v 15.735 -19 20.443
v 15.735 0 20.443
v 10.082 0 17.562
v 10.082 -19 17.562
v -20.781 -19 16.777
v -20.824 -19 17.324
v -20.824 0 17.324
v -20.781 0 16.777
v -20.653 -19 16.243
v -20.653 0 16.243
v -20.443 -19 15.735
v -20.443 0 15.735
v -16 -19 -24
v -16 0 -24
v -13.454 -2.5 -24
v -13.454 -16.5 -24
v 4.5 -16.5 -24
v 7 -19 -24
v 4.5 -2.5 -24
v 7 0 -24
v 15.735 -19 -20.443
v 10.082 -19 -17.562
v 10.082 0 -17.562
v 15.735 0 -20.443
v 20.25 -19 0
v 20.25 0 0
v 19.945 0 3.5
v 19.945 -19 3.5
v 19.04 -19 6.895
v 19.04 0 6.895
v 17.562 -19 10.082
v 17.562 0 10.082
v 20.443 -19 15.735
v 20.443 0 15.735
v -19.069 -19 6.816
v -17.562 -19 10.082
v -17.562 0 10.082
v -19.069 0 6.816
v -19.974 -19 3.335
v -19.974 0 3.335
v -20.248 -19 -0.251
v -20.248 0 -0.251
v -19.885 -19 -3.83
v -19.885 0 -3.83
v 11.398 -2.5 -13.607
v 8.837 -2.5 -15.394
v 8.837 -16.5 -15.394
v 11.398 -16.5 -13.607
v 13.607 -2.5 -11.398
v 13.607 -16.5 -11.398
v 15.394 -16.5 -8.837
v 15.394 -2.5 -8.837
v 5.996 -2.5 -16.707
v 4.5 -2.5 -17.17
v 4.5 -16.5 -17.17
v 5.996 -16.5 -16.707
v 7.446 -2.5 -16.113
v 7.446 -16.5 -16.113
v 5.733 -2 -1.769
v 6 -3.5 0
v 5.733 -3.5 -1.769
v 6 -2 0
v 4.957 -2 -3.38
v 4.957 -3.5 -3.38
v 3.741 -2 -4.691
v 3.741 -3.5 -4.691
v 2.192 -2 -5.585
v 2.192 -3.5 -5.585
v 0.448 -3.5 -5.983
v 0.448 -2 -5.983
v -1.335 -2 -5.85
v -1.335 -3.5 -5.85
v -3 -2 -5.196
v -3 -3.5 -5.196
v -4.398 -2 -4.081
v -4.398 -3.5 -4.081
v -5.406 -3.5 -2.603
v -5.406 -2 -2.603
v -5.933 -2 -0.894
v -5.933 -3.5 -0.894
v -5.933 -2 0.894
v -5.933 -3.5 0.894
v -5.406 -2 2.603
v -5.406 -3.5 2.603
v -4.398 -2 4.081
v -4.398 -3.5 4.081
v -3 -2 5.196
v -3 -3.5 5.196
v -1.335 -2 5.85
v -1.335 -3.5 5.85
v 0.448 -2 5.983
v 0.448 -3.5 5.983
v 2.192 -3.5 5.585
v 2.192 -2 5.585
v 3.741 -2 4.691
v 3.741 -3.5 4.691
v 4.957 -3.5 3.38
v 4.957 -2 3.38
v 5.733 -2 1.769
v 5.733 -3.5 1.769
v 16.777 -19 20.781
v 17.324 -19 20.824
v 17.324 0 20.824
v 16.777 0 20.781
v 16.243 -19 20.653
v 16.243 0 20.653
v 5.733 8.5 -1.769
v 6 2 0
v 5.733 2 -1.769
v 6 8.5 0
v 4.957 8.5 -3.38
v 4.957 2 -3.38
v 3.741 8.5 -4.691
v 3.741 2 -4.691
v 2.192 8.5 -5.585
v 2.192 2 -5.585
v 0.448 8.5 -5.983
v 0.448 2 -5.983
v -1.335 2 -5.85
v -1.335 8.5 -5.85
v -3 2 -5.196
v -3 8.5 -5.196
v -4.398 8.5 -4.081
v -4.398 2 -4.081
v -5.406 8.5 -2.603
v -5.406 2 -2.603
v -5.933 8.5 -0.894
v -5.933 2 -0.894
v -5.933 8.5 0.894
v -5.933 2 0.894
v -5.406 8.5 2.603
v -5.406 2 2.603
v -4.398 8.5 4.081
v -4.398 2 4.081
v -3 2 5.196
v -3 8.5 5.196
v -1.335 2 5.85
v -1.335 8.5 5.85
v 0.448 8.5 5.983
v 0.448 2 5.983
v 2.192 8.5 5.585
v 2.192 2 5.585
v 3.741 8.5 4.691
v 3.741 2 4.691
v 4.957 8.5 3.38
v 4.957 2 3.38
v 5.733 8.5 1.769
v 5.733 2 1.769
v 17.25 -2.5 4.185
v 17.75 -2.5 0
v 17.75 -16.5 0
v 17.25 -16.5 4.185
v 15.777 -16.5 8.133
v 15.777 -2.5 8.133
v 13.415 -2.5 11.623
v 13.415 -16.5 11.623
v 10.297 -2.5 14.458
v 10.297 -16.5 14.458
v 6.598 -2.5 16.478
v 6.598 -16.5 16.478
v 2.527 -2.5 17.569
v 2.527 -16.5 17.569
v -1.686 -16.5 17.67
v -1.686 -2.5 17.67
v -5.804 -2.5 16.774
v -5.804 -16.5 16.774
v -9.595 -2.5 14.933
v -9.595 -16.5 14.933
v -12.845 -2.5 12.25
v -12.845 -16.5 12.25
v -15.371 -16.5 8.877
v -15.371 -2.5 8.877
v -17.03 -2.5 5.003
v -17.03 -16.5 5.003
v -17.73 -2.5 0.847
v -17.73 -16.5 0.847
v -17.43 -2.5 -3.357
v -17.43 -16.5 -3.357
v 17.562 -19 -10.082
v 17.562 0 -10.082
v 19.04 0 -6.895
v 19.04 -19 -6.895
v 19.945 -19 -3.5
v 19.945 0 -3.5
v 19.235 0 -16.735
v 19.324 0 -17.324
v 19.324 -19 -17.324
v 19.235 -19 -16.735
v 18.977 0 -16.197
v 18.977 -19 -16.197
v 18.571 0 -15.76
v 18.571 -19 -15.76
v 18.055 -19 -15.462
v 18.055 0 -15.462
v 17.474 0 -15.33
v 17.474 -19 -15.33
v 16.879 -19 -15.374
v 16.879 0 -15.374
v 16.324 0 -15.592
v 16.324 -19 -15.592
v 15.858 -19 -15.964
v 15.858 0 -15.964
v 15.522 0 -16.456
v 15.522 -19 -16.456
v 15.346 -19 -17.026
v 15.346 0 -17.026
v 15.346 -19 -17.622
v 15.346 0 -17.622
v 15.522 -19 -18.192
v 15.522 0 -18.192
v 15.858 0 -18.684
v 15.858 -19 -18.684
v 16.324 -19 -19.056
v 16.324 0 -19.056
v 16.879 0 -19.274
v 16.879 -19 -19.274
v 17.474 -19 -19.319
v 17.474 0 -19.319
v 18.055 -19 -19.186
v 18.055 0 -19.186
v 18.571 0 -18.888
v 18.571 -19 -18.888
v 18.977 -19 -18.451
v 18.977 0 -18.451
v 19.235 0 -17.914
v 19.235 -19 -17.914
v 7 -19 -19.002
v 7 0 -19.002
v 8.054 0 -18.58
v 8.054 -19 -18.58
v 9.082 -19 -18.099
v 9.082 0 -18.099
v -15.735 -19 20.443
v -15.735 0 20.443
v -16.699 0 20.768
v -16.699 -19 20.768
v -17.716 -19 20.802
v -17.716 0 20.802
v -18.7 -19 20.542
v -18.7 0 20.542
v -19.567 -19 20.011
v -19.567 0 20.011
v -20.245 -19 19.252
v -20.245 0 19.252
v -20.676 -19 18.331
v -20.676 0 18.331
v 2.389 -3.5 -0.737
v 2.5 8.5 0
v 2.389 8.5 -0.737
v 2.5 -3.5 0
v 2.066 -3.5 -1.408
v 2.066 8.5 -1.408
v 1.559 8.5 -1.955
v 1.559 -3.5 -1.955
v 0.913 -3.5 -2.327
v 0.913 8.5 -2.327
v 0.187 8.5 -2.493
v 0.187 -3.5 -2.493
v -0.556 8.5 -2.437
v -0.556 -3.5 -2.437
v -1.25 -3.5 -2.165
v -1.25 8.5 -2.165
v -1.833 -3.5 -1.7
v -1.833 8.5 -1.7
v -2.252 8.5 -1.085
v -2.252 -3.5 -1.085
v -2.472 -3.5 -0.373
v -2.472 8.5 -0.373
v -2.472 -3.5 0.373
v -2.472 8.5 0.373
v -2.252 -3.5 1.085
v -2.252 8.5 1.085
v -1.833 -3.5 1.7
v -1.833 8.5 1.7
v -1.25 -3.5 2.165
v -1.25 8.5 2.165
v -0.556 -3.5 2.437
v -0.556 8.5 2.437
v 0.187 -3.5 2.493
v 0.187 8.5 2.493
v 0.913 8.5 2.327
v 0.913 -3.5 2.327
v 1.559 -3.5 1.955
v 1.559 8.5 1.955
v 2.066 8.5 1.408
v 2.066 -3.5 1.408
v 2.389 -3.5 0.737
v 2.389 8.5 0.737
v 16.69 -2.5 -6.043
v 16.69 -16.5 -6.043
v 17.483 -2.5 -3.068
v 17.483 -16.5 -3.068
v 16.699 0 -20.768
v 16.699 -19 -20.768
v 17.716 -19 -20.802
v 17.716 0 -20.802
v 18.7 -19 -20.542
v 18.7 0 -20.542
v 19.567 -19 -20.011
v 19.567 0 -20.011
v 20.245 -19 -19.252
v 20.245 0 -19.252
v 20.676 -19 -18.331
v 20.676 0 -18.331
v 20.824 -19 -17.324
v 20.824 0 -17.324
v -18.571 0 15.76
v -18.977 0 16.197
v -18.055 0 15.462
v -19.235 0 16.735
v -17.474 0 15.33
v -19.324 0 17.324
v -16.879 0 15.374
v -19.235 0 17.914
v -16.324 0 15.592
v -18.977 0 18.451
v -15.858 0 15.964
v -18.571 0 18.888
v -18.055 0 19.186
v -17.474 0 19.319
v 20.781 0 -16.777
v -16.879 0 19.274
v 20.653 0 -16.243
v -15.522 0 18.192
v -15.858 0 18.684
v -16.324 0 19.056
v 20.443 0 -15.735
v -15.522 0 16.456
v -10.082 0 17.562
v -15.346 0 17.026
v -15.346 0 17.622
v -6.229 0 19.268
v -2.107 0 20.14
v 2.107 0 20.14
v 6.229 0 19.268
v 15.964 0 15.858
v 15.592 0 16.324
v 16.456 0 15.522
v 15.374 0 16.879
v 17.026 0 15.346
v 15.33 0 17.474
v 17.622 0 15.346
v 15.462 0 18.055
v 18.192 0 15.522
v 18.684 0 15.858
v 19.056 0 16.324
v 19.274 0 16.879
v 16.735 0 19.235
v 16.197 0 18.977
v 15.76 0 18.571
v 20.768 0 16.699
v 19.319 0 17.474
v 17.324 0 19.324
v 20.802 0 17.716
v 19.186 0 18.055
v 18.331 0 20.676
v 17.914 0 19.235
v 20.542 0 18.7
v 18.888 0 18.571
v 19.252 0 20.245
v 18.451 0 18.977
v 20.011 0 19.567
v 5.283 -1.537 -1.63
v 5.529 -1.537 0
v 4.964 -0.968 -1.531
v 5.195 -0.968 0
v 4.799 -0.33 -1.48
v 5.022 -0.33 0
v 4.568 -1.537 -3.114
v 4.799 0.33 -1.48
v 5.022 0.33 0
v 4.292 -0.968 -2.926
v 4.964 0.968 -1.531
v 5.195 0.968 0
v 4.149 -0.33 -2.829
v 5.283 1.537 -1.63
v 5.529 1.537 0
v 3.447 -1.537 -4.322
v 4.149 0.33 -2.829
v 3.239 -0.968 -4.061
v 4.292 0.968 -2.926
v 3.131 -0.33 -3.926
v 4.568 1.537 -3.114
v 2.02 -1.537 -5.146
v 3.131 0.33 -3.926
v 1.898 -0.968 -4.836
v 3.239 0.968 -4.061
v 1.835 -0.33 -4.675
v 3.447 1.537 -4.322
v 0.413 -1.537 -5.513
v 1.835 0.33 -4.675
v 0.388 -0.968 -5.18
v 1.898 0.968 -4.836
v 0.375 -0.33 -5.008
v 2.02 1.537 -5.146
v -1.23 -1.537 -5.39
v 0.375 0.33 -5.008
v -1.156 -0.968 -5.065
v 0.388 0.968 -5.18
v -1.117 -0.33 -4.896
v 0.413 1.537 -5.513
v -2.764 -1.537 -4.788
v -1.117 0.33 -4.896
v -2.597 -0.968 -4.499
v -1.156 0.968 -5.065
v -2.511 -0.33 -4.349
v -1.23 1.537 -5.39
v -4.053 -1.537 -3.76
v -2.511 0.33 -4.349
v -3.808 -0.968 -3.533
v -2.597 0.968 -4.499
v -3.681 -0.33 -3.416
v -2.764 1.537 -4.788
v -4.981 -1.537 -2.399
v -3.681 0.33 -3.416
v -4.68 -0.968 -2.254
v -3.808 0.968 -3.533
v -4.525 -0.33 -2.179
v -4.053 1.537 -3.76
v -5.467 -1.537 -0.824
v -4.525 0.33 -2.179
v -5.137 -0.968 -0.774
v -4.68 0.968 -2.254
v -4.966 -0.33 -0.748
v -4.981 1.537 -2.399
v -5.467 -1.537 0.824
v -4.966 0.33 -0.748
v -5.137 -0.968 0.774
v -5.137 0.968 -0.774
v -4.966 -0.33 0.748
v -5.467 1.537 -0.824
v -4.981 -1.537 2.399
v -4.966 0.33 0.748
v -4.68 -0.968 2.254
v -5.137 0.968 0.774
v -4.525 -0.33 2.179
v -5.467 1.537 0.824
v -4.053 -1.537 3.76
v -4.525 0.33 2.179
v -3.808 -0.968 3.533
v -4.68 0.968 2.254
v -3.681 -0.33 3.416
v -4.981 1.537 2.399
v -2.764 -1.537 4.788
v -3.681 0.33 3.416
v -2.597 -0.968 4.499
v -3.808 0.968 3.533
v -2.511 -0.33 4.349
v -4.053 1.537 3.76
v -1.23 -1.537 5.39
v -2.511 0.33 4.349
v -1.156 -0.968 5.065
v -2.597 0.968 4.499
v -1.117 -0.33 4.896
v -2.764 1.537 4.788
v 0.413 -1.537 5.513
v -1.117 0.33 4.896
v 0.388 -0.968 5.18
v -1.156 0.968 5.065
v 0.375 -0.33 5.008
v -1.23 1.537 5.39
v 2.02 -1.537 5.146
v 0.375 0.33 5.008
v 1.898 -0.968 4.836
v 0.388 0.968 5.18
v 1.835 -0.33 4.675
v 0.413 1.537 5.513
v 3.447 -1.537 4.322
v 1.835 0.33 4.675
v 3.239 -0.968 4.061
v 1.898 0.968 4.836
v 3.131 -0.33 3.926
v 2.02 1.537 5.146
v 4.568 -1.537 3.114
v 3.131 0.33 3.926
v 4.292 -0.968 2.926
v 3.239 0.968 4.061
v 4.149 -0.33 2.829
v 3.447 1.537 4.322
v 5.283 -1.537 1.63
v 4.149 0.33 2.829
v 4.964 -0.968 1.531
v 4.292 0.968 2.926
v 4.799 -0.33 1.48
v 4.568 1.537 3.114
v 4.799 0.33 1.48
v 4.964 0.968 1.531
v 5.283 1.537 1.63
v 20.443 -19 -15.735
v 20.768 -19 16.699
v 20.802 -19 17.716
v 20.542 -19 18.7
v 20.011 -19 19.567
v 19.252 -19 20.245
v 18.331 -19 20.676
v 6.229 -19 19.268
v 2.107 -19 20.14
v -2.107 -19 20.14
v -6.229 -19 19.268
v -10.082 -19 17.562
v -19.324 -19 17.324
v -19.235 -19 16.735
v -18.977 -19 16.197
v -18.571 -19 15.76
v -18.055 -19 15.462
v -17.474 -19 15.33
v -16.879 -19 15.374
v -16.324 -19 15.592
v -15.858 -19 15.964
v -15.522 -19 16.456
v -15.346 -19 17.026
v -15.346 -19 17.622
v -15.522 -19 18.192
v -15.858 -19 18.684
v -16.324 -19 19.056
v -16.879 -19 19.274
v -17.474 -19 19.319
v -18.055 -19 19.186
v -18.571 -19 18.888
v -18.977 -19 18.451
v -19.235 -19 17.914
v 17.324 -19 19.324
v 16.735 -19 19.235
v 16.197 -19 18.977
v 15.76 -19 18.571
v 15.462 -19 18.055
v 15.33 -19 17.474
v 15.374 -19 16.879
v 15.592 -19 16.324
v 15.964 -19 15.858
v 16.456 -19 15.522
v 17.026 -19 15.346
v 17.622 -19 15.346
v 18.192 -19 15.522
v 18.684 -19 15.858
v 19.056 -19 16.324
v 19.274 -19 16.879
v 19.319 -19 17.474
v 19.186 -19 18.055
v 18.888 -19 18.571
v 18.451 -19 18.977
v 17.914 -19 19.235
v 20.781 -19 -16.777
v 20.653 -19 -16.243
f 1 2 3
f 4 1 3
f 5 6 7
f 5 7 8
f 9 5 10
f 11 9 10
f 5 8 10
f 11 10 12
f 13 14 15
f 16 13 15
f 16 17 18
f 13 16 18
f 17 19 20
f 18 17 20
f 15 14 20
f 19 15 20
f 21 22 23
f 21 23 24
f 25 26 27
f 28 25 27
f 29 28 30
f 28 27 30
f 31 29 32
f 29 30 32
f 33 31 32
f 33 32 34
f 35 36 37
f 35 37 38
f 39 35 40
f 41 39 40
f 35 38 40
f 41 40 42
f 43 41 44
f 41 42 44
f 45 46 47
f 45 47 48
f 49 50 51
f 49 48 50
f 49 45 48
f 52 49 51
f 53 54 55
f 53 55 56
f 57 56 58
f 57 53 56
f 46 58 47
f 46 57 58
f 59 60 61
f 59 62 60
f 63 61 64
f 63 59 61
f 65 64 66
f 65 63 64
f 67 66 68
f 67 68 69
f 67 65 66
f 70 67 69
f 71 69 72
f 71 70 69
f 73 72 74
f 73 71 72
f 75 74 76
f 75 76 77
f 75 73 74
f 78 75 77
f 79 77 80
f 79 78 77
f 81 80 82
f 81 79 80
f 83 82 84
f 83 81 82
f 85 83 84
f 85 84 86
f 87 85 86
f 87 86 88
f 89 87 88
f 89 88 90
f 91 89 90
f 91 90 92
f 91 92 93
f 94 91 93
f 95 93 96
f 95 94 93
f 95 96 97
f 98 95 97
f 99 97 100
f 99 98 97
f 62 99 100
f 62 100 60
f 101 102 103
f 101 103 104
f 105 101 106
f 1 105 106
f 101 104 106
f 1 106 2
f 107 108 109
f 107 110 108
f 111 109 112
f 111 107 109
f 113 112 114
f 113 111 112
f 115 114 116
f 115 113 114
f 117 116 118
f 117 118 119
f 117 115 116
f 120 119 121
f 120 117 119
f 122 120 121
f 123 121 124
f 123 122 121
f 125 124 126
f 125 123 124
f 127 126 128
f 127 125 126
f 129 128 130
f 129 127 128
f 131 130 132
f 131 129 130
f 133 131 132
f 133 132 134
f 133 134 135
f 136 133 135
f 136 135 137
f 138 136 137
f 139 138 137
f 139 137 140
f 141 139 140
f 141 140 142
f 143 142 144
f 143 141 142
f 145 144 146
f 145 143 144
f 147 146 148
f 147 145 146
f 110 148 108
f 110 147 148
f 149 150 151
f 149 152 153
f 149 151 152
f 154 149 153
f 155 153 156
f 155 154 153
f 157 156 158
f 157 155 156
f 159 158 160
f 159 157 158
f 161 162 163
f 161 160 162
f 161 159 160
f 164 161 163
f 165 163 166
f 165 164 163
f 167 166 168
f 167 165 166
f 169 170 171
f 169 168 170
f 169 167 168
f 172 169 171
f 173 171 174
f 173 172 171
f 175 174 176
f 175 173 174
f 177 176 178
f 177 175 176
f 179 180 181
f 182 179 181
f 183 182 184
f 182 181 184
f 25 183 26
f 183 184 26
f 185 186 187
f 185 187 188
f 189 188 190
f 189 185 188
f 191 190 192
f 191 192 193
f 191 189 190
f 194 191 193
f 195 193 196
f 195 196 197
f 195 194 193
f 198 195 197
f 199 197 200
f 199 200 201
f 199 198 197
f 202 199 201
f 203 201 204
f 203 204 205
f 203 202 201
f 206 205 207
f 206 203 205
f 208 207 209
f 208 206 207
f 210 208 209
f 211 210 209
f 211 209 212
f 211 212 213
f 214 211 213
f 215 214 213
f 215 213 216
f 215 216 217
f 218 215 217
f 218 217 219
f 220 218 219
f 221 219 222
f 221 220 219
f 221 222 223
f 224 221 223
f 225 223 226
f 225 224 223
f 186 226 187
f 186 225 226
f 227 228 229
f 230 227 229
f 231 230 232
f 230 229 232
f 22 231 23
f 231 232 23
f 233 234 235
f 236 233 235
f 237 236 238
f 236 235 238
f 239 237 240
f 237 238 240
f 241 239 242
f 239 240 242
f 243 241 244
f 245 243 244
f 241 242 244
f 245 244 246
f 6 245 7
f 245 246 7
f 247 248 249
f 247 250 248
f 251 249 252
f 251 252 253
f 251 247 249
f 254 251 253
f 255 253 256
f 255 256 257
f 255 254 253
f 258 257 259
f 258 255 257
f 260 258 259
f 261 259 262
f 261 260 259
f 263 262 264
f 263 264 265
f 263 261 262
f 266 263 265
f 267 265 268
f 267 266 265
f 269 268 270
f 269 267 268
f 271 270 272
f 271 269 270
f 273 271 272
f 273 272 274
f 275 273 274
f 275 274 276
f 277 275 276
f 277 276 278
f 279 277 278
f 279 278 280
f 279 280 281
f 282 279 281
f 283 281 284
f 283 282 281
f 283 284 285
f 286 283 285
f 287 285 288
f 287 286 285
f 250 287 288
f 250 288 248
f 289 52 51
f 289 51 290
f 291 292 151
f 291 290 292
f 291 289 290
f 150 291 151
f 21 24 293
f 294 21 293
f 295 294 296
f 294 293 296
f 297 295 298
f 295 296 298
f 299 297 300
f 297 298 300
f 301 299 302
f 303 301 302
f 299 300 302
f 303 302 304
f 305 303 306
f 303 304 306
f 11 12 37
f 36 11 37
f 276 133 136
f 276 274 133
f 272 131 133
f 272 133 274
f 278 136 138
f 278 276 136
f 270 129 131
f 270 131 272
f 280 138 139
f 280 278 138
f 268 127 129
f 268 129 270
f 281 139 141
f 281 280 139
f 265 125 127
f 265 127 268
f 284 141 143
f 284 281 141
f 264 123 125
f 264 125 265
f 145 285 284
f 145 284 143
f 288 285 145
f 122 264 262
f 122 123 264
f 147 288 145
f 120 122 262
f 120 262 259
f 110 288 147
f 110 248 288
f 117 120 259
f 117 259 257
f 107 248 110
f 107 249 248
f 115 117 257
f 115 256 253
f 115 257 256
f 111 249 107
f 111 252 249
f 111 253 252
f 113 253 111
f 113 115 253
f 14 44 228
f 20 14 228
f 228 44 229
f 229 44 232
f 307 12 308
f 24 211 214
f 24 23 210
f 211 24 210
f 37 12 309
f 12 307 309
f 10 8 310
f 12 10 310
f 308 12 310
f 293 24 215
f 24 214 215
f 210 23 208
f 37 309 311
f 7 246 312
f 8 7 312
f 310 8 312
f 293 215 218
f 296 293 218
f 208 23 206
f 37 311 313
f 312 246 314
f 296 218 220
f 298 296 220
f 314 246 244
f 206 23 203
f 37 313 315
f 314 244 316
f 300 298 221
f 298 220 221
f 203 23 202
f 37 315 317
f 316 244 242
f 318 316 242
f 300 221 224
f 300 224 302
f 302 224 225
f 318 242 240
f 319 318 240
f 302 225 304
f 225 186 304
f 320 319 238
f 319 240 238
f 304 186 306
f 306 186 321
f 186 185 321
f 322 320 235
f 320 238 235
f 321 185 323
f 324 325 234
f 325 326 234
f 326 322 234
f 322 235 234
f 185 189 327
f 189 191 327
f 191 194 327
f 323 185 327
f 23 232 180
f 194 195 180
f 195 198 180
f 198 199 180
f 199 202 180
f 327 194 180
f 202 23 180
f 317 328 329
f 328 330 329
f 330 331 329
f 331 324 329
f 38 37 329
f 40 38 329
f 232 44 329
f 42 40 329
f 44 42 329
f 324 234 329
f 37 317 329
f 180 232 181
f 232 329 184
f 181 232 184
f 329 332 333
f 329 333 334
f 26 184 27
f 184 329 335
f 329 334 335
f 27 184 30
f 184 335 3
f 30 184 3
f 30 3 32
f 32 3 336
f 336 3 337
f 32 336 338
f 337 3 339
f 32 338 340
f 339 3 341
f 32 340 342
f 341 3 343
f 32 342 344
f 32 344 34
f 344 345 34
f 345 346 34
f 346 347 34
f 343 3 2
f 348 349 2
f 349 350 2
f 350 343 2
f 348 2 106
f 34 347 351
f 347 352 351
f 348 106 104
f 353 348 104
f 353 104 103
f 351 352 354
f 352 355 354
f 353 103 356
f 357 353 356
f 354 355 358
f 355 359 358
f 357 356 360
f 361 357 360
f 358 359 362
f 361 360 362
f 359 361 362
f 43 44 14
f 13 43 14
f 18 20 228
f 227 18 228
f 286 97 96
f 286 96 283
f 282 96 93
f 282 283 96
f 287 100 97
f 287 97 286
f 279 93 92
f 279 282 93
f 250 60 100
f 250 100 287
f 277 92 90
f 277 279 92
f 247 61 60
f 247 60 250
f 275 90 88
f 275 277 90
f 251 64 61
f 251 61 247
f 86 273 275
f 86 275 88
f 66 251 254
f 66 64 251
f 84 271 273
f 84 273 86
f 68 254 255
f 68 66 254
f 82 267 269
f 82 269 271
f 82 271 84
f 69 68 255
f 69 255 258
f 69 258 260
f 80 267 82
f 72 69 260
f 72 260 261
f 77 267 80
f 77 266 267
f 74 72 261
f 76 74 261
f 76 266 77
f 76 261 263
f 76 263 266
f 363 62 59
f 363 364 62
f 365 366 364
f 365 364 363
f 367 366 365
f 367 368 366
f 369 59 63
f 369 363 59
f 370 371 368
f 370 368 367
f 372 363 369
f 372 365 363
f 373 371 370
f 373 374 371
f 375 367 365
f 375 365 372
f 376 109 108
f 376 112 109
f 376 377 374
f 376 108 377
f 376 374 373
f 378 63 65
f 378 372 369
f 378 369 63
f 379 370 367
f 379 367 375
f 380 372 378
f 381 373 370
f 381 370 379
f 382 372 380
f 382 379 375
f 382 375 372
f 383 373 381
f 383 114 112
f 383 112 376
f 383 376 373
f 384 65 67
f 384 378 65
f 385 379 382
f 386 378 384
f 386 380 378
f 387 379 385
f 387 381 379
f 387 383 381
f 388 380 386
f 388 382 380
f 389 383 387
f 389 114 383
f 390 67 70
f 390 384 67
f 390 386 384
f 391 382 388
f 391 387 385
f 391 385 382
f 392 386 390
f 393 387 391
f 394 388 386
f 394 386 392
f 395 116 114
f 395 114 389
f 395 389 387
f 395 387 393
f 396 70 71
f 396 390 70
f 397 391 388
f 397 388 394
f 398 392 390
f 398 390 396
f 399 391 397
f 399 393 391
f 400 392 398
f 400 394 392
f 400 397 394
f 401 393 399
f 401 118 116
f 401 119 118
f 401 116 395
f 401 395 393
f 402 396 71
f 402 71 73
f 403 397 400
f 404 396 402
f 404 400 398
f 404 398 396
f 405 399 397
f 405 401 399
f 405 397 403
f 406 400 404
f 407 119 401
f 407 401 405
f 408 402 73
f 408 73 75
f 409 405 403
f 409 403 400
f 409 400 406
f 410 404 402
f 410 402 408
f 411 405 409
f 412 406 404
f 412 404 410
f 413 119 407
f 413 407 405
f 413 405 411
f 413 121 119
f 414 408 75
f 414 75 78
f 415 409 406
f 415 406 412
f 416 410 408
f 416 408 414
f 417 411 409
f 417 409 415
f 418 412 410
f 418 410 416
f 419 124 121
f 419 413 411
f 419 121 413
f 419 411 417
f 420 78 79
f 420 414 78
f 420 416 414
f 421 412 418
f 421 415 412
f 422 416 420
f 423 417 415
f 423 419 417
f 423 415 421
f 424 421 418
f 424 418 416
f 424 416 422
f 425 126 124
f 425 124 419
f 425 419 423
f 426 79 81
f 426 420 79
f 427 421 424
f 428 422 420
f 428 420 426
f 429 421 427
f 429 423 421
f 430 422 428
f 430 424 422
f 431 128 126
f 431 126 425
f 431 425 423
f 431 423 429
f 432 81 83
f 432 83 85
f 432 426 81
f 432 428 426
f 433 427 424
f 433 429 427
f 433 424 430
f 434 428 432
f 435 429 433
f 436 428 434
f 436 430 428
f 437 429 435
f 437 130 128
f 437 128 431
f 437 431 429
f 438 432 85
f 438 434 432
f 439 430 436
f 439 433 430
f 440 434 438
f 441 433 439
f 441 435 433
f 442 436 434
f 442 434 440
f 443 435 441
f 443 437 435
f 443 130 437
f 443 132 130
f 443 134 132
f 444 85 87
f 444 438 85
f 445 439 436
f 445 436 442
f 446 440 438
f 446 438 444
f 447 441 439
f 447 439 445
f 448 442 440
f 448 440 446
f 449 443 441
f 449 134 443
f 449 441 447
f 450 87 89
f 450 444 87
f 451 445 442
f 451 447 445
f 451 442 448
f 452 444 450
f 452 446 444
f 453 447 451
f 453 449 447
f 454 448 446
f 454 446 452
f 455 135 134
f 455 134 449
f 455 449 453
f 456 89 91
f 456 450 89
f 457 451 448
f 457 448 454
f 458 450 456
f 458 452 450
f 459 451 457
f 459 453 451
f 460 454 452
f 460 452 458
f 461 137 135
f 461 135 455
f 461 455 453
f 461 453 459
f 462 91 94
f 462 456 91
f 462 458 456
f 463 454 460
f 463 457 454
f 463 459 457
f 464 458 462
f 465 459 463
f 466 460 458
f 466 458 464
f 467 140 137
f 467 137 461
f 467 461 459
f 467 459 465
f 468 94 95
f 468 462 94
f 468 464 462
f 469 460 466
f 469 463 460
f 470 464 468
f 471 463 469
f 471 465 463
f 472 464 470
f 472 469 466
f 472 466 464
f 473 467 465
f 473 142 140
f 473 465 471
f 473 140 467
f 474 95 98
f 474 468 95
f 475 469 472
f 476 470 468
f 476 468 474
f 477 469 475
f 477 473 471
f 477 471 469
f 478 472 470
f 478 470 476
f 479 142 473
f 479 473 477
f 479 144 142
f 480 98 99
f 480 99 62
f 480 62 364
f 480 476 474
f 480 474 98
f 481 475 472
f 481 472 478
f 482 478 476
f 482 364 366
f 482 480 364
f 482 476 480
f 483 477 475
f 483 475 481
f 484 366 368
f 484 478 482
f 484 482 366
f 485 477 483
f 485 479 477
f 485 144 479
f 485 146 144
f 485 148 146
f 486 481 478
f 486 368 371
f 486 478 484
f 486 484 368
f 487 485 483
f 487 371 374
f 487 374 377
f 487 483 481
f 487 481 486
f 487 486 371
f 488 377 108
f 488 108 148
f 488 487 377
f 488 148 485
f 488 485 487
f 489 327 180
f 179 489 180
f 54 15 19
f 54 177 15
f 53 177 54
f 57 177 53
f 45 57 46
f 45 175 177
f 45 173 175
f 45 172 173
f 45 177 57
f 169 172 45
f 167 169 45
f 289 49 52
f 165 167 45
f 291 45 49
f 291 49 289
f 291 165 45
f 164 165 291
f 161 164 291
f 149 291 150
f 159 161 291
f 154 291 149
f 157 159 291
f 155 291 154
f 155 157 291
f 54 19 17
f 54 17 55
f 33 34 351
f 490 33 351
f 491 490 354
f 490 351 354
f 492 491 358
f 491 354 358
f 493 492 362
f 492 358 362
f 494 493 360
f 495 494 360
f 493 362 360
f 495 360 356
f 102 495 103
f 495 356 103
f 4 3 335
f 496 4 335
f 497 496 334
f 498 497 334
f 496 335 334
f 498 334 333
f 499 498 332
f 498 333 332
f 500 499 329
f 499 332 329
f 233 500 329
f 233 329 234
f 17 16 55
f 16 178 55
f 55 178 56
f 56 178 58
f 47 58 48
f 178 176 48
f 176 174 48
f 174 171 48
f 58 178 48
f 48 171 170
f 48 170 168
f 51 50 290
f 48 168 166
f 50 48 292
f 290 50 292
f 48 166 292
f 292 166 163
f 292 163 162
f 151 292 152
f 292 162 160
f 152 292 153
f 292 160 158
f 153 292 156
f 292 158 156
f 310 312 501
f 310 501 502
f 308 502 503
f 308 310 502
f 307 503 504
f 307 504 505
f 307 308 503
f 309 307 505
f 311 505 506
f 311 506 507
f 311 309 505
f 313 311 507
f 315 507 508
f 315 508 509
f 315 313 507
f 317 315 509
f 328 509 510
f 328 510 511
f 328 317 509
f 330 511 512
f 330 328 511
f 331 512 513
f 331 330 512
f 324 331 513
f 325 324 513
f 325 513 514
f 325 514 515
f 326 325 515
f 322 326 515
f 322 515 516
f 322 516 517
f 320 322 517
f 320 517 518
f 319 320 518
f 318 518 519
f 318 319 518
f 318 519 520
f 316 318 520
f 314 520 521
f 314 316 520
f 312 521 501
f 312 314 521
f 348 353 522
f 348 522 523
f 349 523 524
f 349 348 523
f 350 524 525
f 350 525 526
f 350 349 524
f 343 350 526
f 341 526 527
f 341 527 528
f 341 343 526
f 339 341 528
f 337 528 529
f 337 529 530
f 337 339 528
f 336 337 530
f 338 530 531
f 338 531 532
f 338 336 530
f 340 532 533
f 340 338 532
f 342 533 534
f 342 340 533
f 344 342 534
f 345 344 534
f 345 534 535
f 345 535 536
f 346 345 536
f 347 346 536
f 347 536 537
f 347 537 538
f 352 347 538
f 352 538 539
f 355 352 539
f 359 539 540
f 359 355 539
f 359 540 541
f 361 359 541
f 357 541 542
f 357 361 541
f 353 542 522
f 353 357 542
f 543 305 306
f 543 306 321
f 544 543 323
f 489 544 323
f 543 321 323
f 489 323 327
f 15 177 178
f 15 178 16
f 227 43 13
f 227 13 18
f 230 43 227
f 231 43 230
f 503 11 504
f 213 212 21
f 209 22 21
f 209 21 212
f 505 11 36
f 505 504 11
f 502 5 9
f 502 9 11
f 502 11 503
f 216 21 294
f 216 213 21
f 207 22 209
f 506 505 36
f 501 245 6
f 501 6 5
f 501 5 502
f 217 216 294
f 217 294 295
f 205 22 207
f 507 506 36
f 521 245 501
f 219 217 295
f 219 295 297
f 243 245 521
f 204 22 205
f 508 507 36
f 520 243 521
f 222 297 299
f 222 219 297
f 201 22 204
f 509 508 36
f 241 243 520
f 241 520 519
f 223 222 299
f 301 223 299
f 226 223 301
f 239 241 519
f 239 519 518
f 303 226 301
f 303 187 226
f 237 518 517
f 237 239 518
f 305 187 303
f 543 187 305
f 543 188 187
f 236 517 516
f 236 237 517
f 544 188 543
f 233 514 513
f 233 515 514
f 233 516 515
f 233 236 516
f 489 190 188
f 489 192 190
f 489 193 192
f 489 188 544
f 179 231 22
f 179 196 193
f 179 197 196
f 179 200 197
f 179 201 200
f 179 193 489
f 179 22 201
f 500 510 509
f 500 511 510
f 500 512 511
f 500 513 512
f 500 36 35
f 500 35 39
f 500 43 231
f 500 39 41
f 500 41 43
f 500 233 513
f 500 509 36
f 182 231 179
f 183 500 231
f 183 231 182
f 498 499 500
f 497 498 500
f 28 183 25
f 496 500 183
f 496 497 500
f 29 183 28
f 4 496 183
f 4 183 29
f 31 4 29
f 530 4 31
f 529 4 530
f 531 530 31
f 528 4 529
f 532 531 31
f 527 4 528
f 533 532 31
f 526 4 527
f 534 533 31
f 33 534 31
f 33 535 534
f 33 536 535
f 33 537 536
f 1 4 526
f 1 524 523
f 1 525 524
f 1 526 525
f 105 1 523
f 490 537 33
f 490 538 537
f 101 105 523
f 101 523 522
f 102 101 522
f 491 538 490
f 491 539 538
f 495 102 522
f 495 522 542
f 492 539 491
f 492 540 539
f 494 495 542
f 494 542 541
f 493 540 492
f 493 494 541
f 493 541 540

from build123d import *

# Parameters (mm, degrees)
F4_DEPTH        = 19
F5_T            = -2.5
F3_R            = 2
F6_DEPTH        = 19
F6_COPIES_COUNT = 3
F6_COPIES_ANGLE = 180


# Not quite as in the source:
# - a pattern or mirror of a feature is missing from the dataset's text; its kind, count and spacing are read off the source's solid


with BuildPart() as f1:
    # F0 (on Top) → F1 (revolve)
    with BuildSketch(Plane.XY):
        with BuildLine():
            Line((2.5, 8.5), (2.5, -3.5))
            Line((2.5, -3.5), (6, -3.5))
            Line((6, -3.5), (6, -2))
            ThreePointArc((6, -2), (5, 0), (6, 2))
            Line((6, 2), (6, 8.5))
            Line((6, 8.5), (2.5, 8.5))
        make_face()
    revolve(axis=Axis((0, 9.24498985, 0), (0, 1, 0)))


with BuildPart() as f4:
    # F3 (on Front) → F4 (new body)
    with BuildSketch(Plane.XZ):
        with BuildLine():
            ThreePointArc((7, -19.0016446657), (-9.9524559943, -17.6355073554), (-19.8845949623, -3.8295408585))
            Line((-19.8845949623, -3.8295408585), (-16, -24))
            Line((-16, -24), (7, -24))
            Line((7, -24), (7, -19.0016446657))
        make_face()
        with BuildLine():
            ThreePointArc((17.5620061533, -10.0815891541), (19.566465248, -5.2168896574), (20.25, 0))
            ThreePointArc((20.25, 0), (-1.9234671838, 20.1584417551), (-19.8845949623, -3.8295408585))
            ThreePointArc((-19.8845949623, -3.8295408585), (-9.9524559943, -17.6355073554), (7, -19.0016446657))
            ThreePointArc((7, -19.0016446657), (8.5710741316, -18.3466396986), (10.0815891541, -17.5620061533))
            ThreePointArc((10.0815891541, -17.5620061533), (14.318912319, -14.318912319), (17.5620061533, -10.0815891541))
        make_face()
    extrude(amount=F4_DEPTH)

    # F5
    f5_openings = [f4.faces().sort_by_distance(p)[0] for p in [
        (-4.5, -9.5, -24),
    ]]
    offset(amount=F5_T, openings=f5_openings, kind=Kind.INTERSECTION)

    # F3 (on Front) → F6 (join, through all)
    with BuildSketch(Plane.XZ):
        with BuildLine():
            Line((20.4426389737, -15.73514939), (17.5620061533, -10.0815891541))
            ThreePointArc((17.5620061533, -10.0815891541), (14.318912319, -14.318912319), (10.0815891541, -17.5620061533))
            Line((10.0815891541, -17.5620061533), (15.73514939, -20.4426389737))
            ThreePointArc((15.73514939, -20.4426389737), (14.8492424049, -14.8492424049), (20.4426389737, -15.73514939))
        make_face()
        with BuildLine():
            ThreePointArc((20.8241161391, -17.3241161391), (20.7274108605, -16.5070573656), (20.4426389737, -15.73514939))
            ThreePointArc((20.4426389737, -15.73514939), (14.8492424049, -14.8492424049), (15.73514939, -20.4426389737))
            ThreePointArc((15.73514939, -20.4426389737), (19.1528611156, -20.3083567143), (20.8241161391, -17.3241161391))
        make_face()
        with Locations((17.3241161391, -17.3241161391)):
            Circle(F3_R, mode=Mode.SUBTRACT)
    f6 = extrude(amount=F6_DEPTH)

    # F6_copies: F6 ×3 about axis
    f6_copies_axis = Axis((0, 0, 0), (0, -1, 0))
    for i in range(1, F6_COPIES_COUNT):
        add(f6.rotate(f6_copies_axis, i * F6_COPIES_ANGLE / (F6_COPIES_COUNT - 1)))


solid = Compound([f1.part, f4.part])
